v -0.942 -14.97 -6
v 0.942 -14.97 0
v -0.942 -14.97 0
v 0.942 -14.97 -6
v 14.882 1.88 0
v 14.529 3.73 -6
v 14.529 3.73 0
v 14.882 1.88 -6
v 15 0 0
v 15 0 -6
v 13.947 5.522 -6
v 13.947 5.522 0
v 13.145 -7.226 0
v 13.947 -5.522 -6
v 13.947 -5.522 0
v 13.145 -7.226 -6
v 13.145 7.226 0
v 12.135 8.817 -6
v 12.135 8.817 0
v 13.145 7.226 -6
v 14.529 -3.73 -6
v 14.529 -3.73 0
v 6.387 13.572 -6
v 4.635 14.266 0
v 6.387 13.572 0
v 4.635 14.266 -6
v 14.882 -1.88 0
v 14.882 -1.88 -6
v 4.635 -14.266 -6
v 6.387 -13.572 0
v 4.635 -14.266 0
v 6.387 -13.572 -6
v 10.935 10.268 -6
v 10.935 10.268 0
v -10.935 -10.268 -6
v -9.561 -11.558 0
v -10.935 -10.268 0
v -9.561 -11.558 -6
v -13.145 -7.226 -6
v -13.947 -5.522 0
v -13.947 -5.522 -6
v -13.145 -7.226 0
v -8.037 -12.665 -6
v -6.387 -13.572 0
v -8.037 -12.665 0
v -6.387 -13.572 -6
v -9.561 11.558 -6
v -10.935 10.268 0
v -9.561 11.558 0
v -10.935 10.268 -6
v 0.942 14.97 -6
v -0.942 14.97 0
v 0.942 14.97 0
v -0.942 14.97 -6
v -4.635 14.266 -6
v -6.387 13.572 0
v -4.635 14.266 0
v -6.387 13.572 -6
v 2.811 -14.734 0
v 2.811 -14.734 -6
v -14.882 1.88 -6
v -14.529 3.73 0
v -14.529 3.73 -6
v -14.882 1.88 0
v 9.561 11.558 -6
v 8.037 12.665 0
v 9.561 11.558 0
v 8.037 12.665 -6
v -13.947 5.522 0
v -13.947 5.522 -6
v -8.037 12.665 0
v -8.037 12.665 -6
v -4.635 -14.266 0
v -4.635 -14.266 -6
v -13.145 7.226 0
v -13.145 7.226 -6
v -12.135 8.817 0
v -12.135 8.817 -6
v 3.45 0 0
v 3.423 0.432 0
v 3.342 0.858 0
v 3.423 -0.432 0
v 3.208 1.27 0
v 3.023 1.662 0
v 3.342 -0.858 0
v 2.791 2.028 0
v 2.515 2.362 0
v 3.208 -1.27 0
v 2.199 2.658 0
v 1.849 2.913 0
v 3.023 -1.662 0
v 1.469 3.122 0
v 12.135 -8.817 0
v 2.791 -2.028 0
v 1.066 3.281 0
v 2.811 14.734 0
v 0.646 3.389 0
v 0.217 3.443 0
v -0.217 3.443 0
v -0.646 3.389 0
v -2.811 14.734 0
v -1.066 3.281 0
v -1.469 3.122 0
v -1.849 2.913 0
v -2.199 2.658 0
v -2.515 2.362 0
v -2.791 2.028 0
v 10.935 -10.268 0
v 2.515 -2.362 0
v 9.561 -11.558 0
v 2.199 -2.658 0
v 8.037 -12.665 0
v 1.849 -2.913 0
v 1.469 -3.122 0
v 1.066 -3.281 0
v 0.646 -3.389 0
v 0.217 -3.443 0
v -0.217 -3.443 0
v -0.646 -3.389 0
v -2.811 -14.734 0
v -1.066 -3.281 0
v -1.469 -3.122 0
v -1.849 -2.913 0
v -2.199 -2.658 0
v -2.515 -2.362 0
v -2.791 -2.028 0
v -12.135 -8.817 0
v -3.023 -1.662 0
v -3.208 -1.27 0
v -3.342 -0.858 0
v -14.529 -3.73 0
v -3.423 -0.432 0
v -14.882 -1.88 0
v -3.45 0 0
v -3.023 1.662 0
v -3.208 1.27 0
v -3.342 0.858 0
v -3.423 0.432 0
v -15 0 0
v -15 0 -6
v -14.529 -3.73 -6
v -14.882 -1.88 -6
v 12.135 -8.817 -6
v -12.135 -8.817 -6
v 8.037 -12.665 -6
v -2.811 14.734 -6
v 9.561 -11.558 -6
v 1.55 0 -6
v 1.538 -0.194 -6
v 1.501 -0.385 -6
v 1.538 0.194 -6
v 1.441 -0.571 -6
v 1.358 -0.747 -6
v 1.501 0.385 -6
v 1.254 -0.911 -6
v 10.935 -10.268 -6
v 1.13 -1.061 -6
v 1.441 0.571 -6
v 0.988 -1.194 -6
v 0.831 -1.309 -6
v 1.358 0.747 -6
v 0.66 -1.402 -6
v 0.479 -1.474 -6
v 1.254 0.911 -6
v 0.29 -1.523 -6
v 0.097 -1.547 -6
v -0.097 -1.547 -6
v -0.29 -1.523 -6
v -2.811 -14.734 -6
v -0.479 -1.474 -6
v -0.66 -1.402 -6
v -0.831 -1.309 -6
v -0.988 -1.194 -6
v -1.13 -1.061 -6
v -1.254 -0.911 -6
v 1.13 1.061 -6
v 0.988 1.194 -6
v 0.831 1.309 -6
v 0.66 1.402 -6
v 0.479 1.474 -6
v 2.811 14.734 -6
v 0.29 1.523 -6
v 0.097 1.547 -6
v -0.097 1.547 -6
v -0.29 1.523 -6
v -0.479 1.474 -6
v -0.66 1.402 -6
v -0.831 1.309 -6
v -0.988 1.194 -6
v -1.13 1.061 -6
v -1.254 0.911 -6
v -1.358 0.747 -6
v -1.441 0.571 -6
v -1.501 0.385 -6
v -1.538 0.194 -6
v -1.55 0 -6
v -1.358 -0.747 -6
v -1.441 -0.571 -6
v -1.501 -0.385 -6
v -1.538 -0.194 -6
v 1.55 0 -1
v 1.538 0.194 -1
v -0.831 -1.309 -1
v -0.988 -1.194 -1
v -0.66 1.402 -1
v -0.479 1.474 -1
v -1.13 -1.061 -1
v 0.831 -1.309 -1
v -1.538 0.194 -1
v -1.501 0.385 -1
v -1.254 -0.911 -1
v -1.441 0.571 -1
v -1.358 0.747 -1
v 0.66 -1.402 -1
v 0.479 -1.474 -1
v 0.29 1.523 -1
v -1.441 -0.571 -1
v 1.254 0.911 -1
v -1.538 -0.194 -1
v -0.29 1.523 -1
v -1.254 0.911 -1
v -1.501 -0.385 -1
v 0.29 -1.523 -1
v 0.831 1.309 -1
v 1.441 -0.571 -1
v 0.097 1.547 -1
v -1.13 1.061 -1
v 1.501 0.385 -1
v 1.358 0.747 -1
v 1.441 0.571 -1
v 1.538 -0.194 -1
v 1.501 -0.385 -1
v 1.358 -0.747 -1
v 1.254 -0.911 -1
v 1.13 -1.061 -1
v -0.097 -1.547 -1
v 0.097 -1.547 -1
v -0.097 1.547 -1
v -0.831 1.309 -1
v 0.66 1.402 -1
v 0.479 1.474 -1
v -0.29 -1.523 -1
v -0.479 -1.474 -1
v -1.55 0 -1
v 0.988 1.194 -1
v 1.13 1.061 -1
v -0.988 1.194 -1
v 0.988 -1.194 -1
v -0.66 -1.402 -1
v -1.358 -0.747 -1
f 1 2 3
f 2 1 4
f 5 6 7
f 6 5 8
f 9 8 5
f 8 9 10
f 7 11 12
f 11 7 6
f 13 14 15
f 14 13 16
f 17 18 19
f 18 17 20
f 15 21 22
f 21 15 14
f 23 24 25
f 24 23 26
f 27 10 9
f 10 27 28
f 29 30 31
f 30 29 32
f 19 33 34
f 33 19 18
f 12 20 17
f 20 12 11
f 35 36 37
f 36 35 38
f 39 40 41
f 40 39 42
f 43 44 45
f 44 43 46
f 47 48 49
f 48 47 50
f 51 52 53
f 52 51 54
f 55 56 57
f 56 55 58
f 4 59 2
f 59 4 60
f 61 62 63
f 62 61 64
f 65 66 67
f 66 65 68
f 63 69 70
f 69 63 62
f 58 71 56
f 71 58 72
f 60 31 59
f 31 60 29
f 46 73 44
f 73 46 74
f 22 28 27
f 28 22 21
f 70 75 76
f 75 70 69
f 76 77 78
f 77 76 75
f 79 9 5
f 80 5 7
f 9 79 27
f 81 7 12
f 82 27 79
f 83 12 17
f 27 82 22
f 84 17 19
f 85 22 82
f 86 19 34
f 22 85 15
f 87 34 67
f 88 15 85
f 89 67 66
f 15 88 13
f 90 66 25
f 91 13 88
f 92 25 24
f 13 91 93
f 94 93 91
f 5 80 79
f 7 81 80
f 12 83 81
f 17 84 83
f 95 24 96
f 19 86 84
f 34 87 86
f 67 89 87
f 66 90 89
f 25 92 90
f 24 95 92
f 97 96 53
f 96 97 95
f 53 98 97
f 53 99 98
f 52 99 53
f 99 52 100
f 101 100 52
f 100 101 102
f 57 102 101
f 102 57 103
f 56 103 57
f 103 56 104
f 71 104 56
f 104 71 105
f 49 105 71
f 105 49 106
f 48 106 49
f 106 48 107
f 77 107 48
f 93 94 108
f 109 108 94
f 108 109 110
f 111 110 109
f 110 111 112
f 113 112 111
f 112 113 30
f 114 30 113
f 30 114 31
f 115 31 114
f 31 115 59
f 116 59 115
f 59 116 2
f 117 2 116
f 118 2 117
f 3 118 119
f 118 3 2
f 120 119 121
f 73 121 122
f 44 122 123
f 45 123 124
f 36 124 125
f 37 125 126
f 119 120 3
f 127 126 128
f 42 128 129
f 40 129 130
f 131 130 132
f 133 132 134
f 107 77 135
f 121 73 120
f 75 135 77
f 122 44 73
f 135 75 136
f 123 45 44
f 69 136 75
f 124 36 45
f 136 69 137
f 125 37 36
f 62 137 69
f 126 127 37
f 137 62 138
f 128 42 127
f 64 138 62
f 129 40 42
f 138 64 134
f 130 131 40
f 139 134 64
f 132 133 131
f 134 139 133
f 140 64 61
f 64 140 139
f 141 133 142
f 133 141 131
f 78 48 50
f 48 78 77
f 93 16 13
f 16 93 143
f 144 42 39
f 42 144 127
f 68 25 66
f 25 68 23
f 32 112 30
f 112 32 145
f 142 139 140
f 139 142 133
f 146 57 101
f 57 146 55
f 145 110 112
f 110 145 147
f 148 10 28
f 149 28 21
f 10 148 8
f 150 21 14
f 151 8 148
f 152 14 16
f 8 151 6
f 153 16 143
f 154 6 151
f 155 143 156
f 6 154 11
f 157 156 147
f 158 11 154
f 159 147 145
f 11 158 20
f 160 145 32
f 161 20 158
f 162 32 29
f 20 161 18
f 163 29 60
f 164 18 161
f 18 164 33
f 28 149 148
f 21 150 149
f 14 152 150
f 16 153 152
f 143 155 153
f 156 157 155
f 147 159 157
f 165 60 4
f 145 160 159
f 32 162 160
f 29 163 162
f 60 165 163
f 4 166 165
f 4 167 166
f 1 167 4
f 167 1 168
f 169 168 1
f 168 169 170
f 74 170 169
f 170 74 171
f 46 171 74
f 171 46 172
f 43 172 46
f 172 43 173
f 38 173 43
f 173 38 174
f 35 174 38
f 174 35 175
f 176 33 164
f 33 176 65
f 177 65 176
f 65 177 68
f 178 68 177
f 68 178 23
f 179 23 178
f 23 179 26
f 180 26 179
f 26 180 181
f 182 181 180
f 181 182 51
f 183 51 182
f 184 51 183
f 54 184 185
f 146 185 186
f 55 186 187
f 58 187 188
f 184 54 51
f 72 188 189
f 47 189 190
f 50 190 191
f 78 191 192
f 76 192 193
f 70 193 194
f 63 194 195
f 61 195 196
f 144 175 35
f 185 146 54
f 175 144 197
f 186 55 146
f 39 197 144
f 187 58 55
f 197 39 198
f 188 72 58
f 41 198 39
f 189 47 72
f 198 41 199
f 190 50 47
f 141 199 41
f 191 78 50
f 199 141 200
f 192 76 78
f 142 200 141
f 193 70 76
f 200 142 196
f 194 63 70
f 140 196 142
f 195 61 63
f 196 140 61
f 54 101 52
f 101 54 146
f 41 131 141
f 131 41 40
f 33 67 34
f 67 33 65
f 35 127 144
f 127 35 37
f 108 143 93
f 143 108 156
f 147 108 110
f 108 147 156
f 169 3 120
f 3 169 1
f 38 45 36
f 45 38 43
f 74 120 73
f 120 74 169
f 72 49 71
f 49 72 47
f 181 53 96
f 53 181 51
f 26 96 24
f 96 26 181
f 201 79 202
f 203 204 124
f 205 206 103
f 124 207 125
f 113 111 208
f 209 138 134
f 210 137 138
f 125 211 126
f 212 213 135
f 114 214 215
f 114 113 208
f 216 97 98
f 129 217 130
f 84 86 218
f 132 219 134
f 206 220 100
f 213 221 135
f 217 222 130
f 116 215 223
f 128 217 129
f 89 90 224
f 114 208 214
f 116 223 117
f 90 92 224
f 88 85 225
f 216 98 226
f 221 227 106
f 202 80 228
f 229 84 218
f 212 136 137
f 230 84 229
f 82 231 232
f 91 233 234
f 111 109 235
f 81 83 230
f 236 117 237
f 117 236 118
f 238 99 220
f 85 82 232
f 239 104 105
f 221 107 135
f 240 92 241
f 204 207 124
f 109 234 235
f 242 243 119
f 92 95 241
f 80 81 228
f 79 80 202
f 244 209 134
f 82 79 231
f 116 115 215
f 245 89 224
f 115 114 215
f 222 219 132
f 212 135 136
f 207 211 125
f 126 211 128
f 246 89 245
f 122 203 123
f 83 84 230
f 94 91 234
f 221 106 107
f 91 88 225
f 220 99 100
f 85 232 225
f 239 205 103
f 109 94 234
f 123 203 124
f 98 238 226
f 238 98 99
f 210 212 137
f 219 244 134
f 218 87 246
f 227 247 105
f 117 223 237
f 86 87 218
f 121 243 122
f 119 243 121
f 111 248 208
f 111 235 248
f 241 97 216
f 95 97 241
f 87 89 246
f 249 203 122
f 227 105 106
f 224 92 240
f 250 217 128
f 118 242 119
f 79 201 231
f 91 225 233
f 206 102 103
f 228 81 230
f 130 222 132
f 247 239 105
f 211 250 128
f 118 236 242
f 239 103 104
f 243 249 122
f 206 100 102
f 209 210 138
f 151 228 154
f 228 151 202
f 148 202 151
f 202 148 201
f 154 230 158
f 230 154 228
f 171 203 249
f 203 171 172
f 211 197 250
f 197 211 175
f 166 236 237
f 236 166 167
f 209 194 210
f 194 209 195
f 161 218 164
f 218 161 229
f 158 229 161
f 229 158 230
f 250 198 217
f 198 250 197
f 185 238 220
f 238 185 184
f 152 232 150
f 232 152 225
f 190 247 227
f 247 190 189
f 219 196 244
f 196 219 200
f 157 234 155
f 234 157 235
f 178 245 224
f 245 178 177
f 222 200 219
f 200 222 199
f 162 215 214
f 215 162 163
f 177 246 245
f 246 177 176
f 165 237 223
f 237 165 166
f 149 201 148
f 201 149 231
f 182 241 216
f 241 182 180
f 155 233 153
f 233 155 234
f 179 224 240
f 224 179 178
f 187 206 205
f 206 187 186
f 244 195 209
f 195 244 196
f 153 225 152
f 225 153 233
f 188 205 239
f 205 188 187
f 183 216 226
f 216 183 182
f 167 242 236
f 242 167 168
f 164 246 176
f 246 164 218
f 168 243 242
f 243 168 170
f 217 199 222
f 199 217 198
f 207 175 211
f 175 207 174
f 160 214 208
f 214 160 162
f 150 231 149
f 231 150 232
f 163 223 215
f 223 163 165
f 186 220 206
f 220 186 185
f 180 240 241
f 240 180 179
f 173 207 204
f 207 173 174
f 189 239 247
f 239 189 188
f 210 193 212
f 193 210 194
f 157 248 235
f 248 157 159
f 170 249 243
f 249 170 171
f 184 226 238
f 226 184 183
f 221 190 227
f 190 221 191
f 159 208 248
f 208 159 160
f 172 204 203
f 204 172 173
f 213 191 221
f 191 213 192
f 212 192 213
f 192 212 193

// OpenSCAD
$fn = 50;


difference() {
	union() {
		translate(v = [0, 0, -6.0000000000]) {
			cylinder(h = 6, r = 15.0000000000);
		}
		translate(v = [0, 0, -6.0000000000]) {
			cylinder(h = 6, r = 2.8750000000);
		}
	}
	union() {
		translate(v = [0, 0, 0]) {
			rotate(a = [0, 0, 0]) {
				difference() {
					union() {
						translate(v = [0, 0, -6.0000000000]) {
							cylinder(h = 6, r = 1.2500000000);
						}
						translate(v = [0, 0, -1.0000000000]) {
							cylinder(h = 1.0000000000, r1 = 1.5500000000, r2 = 3.4500000000);
						}
						translate(v = [0, 0, -6.0000000000]) {
							cylinder(h = 6, r = 1.5500000000);
						}
						translate(v = [0, 0, -6.0000000000]) {
							cylinder(h = 6, r = 1.2500000000);
						}
					}
					union();
				}
			}
		}
	}
}
